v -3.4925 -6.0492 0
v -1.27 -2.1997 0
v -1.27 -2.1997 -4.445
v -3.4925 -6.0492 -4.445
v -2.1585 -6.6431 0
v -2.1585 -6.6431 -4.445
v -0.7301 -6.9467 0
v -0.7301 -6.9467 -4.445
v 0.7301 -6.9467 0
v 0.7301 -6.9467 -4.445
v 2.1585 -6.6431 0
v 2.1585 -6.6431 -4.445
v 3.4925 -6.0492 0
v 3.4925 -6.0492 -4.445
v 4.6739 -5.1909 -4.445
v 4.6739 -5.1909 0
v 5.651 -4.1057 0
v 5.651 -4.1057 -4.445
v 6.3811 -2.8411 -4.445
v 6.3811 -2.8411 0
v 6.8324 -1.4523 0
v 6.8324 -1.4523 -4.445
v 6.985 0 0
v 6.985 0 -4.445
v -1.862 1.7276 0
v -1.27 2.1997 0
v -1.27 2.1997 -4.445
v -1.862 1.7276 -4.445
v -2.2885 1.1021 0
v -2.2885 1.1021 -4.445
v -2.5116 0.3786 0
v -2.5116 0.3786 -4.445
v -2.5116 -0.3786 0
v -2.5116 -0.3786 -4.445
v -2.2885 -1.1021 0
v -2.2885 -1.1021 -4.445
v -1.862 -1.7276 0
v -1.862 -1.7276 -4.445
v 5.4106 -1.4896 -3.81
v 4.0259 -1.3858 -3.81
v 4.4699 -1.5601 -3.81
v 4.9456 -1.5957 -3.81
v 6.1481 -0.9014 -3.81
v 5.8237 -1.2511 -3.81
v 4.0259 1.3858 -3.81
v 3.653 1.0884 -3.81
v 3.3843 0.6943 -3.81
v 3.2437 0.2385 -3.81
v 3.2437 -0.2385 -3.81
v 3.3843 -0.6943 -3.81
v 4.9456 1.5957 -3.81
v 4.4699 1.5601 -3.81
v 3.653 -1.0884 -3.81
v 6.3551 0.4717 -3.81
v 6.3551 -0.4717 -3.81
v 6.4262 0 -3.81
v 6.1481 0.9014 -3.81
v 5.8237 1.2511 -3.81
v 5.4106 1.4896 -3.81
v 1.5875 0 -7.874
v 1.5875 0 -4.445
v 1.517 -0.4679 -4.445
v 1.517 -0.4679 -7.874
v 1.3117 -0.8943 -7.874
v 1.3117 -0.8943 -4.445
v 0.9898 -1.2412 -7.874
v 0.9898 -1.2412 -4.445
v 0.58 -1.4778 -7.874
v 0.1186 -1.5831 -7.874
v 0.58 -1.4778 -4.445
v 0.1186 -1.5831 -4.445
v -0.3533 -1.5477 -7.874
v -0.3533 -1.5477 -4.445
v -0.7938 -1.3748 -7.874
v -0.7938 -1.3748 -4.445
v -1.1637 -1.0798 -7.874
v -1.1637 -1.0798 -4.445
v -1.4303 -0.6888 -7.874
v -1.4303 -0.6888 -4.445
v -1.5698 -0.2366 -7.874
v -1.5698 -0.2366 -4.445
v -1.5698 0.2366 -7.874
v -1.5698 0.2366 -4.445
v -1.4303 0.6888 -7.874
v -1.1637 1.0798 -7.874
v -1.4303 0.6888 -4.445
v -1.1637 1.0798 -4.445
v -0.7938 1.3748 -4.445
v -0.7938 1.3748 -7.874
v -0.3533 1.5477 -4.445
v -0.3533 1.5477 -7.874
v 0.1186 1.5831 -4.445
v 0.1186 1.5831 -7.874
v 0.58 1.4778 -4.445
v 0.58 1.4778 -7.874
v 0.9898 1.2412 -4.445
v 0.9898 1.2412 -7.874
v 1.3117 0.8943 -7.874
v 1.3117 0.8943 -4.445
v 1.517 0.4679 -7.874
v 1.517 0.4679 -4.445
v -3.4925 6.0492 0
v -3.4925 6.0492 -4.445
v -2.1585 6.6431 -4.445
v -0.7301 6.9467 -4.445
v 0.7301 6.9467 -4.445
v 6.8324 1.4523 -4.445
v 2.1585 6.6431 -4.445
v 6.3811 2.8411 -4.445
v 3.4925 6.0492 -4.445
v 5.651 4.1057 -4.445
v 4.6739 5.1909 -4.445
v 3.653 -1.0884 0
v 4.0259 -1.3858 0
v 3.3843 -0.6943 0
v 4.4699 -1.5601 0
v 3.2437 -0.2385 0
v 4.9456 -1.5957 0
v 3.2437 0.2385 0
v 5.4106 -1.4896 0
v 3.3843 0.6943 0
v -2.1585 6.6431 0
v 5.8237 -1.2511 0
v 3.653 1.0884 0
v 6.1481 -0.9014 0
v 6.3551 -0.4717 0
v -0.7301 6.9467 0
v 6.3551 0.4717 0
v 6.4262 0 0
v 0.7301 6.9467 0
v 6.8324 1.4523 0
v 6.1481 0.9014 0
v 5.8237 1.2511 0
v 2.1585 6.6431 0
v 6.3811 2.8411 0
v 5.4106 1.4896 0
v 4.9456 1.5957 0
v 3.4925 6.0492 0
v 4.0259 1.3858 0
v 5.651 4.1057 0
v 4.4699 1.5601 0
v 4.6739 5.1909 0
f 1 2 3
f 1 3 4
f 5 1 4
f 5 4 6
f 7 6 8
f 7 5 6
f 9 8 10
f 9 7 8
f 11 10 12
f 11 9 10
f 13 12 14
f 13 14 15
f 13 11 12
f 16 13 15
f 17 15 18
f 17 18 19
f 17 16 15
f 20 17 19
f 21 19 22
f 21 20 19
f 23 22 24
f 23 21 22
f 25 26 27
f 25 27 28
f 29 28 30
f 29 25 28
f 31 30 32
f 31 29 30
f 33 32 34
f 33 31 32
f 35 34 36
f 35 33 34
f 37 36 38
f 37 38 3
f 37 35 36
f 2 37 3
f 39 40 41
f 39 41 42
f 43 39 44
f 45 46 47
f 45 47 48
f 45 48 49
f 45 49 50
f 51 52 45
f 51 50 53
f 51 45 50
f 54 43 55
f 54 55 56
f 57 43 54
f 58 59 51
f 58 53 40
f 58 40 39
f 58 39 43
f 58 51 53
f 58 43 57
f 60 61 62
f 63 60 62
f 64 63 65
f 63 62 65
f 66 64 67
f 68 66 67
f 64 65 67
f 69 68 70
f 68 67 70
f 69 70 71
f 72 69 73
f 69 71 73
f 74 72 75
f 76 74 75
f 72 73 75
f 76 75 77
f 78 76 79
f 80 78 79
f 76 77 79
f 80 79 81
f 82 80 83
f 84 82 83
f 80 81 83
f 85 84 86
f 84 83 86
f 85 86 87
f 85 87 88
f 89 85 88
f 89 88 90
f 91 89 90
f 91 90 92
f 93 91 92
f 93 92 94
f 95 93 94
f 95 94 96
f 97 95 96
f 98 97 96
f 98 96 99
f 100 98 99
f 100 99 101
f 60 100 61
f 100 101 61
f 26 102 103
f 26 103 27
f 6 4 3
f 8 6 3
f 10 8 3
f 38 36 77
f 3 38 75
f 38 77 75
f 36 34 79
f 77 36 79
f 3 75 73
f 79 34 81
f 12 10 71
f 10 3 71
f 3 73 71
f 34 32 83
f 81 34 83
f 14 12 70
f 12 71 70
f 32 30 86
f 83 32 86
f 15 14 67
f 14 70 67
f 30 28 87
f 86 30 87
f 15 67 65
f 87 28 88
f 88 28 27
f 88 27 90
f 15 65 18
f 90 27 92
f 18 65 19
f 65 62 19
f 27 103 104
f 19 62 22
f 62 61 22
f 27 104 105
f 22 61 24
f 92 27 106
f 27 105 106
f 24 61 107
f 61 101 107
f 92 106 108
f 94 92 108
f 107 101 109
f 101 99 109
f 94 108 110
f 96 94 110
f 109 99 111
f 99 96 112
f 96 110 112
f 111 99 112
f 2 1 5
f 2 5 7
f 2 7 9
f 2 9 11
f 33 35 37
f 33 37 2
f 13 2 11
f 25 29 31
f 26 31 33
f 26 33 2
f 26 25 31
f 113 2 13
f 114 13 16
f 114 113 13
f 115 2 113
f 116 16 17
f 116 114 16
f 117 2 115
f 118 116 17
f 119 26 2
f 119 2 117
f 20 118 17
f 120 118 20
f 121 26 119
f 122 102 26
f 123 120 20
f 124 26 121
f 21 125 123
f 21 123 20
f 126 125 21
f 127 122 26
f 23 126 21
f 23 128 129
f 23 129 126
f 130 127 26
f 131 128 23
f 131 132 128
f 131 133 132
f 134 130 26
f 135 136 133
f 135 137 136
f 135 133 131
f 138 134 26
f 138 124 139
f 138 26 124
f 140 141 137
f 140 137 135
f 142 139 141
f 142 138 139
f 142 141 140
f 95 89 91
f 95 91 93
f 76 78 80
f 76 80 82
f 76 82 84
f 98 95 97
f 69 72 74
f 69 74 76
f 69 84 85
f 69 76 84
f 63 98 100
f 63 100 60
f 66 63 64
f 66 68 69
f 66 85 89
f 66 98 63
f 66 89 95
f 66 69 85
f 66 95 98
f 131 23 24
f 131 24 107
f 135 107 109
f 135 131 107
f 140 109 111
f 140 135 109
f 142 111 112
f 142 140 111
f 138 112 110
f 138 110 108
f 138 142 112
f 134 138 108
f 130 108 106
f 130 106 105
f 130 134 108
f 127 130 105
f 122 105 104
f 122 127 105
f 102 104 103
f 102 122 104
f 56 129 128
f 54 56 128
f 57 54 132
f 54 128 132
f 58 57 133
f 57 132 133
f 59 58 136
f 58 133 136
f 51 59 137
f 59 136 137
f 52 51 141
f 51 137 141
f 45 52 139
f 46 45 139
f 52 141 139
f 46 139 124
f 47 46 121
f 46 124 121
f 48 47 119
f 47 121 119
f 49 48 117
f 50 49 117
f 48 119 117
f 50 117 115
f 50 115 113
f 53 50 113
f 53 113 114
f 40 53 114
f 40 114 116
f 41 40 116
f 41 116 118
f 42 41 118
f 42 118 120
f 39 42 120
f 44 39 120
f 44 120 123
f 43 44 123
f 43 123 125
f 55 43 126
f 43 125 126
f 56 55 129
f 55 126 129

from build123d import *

# Parameters (mm, degrees)
F0_R     = 1.6002
F1_DEPTH = 4.445
F2_DEPTH = 3.81
F3_R     = 1.5875
F4_DEPTH = 3.429


with BuildPart() as f1:
    # F0 (on Top) → F1 (new body)
    with BuildSketch(Plane.XY):
        with BuildLine():
            ThreePointArc((-3.4925, -6.049187), (3.4925, -6.049187), (6.985, 0))
            ThreePointArc((6.985, 0), (3.4925, 6.049187), (-3.4925, 6.049187))
            Line((-3.4925, 6.049187), (-1.27, 2.199705))
            ThreePointArc((-1.27, 2.199705), (1.27, 2.199705), (2.54, 0))
            ThreePointArc((2.54, 0), (1.27, -2.199705), (-1.27, -2.199705))
            Line((-1.27, -2.199705), (-3.4925, -6.049187))
        make_face()
        with Locations((4.826, 0)):
            Circle(F0_R, mode=Mode.SUBTRACT)
        with BuildLine():
            Line((0, 0), (-1.27, 2.199705))
            ThreePointArc((-1.27, 2.199705), (-2.54, 0), (-1.27, -2.199705))
            Line((-1.27, -2.199705), (0, 0))
        make_face()
        with Locations((4.826, 0)):
            Circle(F0_R)
        with BuildLine():
            ThreePointArc((2.54, 0), (1.27, 2.199705), (-1.27, 2.199705))
            Line((-1.27, 2.199705), (0, 0))
            Line((0, 0), (-1.27, -2.199705))
            ThreePointArc((-1.27, -2.199705), (1.27, -2.199705), (2.54, 0))
        make_face()
    extrude(amount=-F1_DEPTH)

    # F0 (on Top) → F2 (cut)
    with BuildSketch(Plane.XY):
        with Locations((4.826, 0)):
            Circle(F0_R)
    extrude(amount=-F2_DEPTH, mode=Mode.SUBTRACT)

    # F3 (on face) → F4 (join)
    with BuildSketch(Plane(origin=(0, 0, -4.445), x_dir=(1, 0, 0), z_dir=(0, 0, -1))):
        Circle(F3_R)
    extrude(amount=F4_DEPTH)


solid = f1.part
